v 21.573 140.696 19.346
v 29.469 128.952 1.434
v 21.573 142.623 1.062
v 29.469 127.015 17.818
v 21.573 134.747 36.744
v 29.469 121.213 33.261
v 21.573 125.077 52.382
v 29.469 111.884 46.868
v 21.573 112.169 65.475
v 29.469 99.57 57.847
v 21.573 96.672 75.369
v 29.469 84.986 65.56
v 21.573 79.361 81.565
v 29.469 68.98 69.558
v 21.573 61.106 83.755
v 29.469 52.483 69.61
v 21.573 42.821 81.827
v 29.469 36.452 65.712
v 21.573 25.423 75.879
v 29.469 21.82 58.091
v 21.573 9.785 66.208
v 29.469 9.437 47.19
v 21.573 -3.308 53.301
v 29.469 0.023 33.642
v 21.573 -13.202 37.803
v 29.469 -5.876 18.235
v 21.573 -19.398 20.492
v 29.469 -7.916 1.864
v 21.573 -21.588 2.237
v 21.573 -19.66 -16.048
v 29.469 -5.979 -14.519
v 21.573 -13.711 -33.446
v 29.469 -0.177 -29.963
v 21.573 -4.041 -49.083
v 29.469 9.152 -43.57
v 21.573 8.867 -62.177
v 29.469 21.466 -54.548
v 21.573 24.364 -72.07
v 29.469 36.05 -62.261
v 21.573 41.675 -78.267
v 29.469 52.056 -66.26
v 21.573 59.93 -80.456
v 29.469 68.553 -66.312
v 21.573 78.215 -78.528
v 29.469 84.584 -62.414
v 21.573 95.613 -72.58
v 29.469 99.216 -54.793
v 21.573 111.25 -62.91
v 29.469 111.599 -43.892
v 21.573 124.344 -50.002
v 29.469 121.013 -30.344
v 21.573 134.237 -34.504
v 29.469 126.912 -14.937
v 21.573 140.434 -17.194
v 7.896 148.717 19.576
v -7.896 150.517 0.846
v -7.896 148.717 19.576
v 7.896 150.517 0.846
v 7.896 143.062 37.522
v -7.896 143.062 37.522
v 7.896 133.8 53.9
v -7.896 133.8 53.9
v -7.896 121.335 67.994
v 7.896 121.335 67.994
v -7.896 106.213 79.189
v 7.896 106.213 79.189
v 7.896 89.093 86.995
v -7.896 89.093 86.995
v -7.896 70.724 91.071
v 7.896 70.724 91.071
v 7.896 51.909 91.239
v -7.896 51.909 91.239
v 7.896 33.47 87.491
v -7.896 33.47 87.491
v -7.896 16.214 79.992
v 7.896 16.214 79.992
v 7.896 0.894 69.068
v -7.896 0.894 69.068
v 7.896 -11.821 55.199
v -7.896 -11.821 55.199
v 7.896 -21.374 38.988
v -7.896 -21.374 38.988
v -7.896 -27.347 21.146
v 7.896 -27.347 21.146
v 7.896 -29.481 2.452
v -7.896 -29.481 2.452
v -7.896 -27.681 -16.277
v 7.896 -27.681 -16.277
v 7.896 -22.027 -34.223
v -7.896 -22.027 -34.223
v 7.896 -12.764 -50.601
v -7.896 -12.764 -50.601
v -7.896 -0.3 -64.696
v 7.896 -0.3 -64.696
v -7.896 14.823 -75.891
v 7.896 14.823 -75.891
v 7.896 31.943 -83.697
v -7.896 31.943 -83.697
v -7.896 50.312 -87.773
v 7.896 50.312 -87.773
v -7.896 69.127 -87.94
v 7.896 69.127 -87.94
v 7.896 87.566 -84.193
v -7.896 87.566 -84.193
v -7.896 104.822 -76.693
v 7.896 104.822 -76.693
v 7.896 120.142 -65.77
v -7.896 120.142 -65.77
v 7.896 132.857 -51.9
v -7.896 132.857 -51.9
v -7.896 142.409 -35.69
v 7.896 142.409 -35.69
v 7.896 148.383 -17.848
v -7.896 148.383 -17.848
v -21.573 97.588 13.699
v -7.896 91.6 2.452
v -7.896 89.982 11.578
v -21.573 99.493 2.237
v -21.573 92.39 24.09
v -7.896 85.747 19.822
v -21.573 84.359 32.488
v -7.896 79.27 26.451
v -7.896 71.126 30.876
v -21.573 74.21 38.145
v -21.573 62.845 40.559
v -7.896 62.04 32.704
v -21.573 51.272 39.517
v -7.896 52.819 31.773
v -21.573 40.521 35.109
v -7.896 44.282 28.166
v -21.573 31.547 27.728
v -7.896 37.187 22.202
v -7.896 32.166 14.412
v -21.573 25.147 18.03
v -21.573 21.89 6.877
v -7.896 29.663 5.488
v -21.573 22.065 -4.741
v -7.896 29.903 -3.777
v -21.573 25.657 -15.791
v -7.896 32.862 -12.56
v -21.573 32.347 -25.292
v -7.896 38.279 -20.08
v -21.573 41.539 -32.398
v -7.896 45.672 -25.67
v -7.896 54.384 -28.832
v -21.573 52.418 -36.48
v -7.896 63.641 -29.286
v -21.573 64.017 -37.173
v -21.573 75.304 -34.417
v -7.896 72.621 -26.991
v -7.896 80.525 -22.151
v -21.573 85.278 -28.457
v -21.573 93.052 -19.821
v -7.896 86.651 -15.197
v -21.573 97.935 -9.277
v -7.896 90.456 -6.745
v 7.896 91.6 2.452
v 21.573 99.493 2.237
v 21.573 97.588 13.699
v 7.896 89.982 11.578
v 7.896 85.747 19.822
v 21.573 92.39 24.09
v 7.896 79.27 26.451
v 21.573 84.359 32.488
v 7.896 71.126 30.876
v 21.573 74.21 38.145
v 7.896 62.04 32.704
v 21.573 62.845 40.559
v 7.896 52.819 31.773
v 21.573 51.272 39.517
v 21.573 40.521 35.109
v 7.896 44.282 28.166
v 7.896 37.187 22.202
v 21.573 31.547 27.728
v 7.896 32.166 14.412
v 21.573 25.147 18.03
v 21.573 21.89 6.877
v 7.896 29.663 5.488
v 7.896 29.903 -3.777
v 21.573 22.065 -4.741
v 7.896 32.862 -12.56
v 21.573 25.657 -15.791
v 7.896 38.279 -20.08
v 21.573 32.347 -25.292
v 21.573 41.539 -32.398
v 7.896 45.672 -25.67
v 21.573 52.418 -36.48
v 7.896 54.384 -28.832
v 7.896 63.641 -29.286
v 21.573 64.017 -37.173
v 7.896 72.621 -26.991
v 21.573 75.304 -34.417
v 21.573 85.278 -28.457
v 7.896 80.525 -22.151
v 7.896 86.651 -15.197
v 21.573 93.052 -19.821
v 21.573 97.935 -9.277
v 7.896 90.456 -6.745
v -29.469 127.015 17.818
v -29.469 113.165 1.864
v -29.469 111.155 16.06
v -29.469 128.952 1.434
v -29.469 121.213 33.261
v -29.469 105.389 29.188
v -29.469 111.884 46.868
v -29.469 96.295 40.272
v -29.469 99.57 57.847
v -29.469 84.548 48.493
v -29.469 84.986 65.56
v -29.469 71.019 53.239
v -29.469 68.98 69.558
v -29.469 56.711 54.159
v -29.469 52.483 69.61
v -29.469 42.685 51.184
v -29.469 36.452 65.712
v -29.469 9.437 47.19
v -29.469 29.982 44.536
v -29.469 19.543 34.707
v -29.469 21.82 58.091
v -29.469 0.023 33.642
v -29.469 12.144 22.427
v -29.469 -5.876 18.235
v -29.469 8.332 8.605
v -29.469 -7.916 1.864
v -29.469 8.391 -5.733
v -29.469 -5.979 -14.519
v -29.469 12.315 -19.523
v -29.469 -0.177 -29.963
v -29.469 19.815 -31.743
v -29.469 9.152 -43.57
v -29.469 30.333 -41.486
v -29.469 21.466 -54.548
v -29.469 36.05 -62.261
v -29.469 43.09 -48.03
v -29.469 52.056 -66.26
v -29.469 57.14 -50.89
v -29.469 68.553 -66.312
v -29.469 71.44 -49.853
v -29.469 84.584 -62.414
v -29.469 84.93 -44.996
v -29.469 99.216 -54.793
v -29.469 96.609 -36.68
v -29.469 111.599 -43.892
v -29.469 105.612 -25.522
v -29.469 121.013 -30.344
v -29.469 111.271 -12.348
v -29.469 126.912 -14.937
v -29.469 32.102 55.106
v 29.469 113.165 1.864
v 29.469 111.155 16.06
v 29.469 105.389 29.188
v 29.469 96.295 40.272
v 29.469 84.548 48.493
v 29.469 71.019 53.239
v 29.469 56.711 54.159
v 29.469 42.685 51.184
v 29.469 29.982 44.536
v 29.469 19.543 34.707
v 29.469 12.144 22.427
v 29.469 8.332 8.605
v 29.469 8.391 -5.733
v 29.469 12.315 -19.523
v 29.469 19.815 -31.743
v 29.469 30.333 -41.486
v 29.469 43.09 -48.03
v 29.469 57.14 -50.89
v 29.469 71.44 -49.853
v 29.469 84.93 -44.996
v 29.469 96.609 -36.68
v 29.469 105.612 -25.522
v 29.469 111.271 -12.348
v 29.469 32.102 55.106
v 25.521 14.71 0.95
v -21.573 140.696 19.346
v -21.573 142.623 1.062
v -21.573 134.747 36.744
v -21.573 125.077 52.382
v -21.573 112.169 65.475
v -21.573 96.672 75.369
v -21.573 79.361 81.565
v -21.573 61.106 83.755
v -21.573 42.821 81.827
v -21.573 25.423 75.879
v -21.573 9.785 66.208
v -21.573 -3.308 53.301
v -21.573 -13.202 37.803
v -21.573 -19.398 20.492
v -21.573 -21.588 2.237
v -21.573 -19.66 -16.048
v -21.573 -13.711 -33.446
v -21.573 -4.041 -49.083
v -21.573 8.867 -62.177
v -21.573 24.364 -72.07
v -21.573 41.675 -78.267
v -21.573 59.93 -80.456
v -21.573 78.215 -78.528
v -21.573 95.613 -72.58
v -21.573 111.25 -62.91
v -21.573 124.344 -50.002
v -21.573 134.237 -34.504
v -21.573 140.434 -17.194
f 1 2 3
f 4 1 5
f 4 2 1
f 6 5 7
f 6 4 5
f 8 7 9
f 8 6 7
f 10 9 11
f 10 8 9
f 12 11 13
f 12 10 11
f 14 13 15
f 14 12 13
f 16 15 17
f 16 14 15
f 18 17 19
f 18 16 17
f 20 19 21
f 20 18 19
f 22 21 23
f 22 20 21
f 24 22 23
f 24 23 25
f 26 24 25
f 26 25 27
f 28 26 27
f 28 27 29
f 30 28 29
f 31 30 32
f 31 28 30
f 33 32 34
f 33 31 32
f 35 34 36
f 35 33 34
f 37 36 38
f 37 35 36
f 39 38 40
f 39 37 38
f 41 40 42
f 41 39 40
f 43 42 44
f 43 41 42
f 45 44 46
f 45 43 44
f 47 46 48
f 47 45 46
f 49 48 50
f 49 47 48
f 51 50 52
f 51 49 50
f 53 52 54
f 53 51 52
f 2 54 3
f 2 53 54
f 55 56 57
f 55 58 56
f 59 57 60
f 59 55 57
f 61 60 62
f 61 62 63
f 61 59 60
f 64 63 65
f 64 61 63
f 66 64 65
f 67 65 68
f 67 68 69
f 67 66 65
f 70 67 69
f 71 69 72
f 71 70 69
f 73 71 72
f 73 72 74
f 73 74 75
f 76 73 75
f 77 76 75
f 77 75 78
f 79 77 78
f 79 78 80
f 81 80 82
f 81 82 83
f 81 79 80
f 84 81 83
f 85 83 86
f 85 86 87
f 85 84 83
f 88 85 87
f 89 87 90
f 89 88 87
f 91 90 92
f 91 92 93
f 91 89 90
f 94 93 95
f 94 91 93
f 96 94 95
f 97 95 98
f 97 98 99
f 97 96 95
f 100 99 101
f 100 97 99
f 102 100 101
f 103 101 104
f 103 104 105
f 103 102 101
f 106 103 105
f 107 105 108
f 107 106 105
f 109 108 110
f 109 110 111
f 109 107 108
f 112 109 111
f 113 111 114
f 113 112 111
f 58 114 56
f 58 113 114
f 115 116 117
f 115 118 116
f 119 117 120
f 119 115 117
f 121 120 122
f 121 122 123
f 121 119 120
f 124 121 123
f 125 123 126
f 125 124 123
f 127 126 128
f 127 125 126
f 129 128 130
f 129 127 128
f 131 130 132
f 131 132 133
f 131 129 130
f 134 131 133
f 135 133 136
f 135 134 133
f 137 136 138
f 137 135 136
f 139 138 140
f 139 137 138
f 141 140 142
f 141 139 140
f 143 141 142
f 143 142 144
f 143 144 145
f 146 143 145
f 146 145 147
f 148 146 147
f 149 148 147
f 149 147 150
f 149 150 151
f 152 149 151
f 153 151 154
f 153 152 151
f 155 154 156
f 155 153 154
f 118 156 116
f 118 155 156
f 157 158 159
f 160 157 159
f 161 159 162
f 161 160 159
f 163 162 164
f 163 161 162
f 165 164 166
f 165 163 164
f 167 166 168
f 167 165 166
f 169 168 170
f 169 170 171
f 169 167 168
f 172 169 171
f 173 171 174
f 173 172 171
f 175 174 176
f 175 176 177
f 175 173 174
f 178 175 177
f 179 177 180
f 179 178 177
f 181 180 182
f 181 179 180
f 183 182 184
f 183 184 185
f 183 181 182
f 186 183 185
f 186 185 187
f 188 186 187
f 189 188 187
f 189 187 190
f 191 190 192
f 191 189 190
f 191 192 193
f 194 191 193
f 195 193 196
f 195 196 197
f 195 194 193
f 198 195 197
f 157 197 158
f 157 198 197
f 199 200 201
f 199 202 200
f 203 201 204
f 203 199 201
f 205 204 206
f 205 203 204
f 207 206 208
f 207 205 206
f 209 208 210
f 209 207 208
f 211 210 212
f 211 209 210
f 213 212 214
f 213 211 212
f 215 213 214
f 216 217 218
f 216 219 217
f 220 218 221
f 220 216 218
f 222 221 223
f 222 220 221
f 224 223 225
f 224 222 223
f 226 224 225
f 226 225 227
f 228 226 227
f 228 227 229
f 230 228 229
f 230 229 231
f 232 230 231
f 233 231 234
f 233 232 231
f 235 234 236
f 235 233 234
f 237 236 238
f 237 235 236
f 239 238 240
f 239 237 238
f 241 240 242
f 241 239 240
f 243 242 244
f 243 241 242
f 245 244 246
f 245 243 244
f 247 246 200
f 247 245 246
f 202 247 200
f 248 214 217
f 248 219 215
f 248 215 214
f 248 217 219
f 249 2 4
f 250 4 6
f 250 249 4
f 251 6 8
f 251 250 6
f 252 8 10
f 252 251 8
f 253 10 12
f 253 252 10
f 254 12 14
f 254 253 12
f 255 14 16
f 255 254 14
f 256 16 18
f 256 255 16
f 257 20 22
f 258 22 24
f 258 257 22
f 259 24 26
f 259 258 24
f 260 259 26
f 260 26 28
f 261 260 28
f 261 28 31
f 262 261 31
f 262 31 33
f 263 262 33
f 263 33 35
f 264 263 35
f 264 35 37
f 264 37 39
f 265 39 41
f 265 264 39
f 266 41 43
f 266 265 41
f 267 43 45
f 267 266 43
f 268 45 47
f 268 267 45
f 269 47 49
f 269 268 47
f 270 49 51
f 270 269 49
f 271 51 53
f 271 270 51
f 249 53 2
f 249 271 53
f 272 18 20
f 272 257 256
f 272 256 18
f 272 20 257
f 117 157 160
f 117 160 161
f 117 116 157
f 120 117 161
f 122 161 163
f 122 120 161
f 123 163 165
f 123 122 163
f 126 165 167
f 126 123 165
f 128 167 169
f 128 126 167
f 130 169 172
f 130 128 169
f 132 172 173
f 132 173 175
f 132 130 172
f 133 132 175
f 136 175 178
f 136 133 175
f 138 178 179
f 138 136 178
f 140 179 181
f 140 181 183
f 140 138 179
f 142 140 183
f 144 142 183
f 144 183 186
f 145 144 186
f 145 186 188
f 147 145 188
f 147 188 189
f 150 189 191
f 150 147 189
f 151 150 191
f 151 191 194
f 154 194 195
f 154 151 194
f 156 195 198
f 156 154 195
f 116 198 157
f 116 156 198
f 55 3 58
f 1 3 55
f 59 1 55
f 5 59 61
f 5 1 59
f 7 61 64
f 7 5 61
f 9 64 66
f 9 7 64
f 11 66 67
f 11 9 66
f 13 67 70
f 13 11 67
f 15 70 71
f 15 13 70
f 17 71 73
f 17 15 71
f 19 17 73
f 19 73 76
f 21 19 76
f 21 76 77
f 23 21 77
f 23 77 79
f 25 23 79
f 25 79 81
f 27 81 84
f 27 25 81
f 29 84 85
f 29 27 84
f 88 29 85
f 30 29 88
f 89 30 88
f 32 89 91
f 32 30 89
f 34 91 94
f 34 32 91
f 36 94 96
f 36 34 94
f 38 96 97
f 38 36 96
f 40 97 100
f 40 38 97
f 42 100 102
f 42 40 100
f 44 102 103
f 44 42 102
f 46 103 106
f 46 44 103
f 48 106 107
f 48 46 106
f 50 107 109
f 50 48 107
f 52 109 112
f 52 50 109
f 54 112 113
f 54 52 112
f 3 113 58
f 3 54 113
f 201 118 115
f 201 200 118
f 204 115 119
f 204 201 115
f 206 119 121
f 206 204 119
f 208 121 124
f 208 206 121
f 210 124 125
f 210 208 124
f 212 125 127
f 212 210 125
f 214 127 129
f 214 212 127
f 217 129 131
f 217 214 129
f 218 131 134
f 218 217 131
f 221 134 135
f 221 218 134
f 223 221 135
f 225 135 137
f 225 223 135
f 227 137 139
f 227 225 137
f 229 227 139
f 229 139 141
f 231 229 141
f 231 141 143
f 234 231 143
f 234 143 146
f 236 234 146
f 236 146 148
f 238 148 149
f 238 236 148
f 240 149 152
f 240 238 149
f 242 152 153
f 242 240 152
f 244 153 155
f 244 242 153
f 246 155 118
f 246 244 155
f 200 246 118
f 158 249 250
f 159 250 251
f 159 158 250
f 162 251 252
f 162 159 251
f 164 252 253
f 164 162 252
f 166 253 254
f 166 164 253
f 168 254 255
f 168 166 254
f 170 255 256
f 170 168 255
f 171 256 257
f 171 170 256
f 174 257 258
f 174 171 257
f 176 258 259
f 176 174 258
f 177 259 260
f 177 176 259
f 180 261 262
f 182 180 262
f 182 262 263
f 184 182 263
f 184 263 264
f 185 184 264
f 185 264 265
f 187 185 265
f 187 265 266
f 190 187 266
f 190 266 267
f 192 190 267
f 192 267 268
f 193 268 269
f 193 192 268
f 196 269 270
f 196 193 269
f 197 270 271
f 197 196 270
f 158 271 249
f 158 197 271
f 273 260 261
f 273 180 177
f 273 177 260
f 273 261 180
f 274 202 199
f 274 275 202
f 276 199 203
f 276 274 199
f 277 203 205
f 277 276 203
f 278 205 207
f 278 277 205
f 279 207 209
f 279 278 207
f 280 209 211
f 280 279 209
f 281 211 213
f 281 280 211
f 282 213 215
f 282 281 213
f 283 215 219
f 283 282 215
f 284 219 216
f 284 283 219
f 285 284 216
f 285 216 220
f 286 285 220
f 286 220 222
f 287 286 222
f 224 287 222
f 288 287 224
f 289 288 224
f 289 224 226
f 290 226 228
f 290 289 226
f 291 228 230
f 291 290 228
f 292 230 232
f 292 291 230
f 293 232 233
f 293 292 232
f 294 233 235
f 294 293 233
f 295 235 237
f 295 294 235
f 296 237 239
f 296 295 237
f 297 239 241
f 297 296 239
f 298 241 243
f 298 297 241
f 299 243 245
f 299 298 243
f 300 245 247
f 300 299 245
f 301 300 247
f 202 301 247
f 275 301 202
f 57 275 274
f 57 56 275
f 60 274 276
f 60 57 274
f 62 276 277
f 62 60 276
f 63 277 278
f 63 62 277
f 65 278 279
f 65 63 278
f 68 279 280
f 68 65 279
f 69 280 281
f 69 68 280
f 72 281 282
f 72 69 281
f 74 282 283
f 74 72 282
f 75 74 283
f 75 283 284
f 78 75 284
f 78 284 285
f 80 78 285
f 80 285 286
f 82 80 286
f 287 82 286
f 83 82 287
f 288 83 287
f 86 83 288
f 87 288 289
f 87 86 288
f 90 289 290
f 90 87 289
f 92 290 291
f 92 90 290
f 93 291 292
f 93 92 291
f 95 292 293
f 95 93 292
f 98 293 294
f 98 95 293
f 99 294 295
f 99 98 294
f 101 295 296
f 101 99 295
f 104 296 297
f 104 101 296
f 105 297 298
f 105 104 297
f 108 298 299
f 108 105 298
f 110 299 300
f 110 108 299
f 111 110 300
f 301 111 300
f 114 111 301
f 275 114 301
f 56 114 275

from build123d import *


with BuildPart() as f2:
    # F2: sweep along a path in F1
    with BuildLine(Plane.YZ) as f2_path:
        CenterArc((60.517904, 1.649187), 60.540371, 0, 360)
    # F0 (on Top) → F2 (sweep)
    with BuildSketch(Plane.XY):
        Polygon((-29.469332, 7.896284), (-29.469332, -7.896284), (-21.573048, -21.573048), (-7.896284, -29.469332), (7.896284, -29.469332), (21.573048, -21.573048), (29.469332, -7.896284), (29.469332, 7.896284), (21.573048, 21.573048), (7.896284, 29.469332), (-7.896284, 29.469332), (-21.573048, 21.573048), align=None)
    sweep(path=f2_path.line)


solid = f2.part
